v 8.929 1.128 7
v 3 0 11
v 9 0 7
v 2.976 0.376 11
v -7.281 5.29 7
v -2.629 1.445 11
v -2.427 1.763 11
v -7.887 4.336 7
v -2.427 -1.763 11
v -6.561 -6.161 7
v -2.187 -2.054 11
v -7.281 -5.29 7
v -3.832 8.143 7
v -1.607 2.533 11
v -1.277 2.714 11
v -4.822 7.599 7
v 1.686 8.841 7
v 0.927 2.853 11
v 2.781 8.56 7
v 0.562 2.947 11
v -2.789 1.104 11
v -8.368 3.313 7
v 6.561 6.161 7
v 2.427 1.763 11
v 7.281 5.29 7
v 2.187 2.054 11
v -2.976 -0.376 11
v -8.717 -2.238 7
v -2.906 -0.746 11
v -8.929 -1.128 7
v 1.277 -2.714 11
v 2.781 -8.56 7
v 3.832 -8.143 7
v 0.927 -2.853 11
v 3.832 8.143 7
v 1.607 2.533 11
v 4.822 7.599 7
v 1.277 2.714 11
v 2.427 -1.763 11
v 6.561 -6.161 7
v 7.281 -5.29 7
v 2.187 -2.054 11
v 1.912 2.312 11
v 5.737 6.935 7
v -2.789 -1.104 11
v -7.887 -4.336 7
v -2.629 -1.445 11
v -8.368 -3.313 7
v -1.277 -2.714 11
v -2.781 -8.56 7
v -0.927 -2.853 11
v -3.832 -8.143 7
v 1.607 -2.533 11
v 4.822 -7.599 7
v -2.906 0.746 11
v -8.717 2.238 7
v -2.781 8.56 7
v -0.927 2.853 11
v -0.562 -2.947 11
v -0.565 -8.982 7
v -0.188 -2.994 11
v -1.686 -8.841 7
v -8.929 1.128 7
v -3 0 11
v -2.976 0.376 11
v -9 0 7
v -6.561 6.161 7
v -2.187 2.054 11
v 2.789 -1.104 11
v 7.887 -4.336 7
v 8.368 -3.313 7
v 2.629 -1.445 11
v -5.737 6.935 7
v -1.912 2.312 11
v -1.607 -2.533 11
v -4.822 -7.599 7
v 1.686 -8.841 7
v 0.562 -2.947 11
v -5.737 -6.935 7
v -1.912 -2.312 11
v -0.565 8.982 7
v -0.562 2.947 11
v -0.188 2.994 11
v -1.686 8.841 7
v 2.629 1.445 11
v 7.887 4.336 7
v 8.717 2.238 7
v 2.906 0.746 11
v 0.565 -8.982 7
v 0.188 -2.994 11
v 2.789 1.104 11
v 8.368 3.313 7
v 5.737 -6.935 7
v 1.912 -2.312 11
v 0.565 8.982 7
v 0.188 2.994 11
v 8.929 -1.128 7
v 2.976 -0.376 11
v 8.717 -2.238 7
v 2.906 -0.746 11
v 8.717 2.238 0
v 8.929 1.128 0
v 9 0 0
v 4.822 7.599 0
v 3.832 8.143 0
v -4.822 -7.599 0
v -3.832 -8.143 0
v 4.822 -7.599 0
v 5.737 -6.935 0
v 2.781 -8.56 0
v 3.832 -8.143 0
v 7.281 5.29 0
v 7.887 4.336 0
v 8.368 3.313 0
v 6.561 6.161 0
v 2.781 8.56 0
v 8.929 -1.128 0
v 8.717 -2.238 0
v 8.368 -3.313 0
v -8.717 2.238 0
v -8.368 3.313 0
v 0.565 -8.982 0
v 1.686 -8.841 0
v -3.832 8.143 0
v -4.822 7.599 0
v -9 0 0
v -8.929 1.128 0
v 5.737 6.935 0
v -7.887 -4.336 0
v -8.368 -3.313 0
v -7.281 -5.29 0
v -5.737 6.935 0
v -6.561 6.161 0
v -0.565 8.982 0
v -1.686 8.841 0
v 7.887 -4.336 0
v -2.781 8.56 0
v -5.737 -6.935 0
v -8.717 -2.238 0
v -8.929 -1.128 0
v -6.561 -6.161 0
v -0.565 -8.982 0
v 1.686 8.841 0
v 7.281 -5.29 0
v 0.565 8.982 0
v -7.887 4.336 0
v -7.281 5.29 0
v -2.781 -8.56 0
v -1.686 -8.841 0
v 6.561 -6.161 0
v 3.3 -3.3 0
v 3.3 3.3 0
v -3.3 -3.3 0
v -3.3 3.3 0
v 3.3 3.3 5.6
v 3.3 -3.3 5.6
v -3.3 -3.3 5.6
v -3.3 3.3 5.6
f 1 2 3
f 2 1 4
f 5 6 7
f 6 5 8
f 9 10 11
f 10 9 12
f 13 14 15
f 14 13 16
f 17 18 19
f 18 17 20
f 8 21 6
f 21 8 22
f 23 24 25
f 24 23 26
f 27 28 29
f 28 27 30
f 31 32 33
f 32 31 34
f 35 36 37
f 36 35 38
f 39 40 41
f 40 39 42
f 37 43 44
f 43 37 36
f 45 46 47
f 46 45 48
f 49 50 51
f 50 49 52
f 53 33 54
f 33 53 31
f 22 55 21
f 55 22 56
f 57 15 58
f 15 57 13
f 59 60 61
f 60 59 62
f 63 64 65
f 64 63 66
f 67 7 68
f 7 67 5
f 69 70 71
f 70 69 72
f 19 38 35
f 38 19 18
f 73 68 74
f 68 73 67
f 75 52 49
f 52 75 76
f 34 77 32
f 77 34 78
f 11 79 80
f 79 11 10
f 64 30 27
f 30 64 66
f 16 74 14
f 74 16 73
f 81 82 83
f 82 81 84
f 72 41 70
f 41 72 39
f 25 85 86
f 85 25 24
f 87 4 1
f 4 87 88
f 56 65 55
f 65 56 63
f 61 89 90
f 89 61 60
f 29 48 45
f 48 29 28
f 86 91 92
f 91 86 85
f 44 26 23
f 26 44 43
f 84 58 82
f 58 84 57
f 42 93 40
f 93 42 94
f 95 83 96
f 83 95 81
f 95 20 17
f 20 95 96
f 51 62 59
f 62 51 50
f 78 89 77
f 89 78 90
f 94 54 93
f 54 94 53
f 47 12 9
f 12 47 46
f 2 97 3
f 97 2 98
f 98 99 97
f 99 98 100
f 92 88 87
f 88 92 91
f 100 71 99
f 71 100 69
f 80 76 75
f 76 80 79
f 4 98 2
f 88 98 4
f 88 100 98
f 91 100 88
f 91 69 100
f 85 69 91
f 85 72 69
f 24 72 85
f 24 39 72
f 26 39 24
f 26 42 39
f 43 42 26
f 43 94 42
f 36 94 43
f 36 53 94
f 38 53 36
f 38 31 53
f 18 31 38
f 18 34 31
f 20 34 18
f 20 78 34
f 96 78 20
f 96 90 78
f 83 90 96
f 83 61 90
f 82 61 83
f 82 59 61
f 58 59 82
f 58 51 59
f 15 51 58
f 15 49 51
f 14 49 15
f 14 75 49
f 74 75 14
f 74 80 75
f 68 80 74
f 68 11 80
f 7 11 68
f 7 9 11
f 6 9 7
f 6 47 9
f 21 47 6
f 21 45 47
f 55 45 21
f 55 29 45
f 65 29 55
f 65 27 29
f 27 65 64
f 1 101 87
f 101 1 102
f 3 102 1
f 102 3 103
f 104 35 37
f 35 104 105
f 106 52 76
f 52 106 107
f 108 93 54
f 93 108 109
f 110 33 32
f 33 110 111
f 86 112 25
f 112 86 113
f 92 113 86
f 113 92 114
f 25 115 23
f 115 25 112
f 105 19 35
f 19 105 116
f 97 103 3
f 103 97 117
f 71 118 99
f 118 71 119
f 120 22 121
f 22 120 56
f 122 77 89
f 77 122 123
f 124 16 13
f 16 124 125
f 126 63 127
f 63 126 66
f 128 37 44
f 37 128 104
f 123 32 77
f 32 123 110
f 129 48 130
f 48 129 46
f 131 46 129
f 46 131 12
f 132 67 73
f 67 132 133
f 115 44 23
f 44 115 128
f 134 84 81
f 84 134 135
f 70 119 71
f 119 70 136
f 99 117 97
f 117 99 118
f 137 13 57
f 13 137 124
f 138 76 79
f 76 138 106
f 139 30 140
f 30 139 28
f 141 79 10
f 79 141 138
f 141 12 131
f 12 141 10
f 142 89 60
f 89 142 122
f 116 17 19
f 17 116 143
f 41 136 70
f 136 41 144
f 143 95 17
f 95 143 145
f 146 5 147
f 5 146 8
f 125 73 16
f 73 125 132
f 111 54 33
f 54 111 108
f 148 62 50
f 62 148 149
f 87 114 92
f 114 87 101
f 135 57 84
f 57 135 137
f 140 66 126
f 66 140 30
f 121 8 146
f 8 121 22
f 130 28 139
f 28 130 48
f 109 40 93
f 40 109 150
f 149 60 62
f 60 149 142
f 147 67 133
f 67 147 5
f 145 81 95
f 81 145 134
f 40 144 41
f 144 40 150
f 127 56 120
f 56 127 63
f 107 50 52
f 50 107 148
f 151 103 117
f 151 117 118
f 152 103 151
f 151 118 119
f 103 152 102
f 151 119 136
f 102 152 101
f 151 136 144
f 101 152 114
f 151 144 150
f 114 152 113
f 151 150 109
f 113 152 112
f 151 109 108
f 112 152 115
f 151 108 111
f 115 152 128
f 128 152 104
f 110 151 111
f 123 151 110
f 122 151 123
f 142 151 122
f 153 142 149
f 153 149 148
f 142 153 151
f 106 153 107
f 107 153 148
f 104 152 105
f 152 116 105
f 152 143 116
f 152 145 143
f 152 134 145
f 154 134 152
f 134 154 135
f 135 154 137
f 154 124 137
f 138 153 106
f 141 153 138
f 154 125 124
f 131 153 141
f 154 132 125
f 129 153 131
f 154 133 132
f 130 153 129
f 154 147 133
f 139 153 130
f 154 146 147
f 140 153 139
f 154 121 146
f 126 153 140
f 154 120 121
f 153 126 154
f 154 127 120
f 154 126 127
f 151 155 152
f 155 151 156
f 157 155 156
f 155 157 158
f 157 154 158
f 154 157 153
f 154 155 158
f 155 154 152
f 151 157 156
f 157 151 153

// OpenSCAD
difference() {
  union() {
    cylinder(h = 7, r = 9);
    translate([0, 0, 7]) {
      intersection() {
        cylinder(h = 6, r1 = 9, r2 = 0);
        cylinder(h = 4, r = 9);
      }
    }
  }
  translate([-3.3, -3.3, -0.2]) {
    cube([6.6, 6.6, 5.8]);
  }
}
$fn = 50;
